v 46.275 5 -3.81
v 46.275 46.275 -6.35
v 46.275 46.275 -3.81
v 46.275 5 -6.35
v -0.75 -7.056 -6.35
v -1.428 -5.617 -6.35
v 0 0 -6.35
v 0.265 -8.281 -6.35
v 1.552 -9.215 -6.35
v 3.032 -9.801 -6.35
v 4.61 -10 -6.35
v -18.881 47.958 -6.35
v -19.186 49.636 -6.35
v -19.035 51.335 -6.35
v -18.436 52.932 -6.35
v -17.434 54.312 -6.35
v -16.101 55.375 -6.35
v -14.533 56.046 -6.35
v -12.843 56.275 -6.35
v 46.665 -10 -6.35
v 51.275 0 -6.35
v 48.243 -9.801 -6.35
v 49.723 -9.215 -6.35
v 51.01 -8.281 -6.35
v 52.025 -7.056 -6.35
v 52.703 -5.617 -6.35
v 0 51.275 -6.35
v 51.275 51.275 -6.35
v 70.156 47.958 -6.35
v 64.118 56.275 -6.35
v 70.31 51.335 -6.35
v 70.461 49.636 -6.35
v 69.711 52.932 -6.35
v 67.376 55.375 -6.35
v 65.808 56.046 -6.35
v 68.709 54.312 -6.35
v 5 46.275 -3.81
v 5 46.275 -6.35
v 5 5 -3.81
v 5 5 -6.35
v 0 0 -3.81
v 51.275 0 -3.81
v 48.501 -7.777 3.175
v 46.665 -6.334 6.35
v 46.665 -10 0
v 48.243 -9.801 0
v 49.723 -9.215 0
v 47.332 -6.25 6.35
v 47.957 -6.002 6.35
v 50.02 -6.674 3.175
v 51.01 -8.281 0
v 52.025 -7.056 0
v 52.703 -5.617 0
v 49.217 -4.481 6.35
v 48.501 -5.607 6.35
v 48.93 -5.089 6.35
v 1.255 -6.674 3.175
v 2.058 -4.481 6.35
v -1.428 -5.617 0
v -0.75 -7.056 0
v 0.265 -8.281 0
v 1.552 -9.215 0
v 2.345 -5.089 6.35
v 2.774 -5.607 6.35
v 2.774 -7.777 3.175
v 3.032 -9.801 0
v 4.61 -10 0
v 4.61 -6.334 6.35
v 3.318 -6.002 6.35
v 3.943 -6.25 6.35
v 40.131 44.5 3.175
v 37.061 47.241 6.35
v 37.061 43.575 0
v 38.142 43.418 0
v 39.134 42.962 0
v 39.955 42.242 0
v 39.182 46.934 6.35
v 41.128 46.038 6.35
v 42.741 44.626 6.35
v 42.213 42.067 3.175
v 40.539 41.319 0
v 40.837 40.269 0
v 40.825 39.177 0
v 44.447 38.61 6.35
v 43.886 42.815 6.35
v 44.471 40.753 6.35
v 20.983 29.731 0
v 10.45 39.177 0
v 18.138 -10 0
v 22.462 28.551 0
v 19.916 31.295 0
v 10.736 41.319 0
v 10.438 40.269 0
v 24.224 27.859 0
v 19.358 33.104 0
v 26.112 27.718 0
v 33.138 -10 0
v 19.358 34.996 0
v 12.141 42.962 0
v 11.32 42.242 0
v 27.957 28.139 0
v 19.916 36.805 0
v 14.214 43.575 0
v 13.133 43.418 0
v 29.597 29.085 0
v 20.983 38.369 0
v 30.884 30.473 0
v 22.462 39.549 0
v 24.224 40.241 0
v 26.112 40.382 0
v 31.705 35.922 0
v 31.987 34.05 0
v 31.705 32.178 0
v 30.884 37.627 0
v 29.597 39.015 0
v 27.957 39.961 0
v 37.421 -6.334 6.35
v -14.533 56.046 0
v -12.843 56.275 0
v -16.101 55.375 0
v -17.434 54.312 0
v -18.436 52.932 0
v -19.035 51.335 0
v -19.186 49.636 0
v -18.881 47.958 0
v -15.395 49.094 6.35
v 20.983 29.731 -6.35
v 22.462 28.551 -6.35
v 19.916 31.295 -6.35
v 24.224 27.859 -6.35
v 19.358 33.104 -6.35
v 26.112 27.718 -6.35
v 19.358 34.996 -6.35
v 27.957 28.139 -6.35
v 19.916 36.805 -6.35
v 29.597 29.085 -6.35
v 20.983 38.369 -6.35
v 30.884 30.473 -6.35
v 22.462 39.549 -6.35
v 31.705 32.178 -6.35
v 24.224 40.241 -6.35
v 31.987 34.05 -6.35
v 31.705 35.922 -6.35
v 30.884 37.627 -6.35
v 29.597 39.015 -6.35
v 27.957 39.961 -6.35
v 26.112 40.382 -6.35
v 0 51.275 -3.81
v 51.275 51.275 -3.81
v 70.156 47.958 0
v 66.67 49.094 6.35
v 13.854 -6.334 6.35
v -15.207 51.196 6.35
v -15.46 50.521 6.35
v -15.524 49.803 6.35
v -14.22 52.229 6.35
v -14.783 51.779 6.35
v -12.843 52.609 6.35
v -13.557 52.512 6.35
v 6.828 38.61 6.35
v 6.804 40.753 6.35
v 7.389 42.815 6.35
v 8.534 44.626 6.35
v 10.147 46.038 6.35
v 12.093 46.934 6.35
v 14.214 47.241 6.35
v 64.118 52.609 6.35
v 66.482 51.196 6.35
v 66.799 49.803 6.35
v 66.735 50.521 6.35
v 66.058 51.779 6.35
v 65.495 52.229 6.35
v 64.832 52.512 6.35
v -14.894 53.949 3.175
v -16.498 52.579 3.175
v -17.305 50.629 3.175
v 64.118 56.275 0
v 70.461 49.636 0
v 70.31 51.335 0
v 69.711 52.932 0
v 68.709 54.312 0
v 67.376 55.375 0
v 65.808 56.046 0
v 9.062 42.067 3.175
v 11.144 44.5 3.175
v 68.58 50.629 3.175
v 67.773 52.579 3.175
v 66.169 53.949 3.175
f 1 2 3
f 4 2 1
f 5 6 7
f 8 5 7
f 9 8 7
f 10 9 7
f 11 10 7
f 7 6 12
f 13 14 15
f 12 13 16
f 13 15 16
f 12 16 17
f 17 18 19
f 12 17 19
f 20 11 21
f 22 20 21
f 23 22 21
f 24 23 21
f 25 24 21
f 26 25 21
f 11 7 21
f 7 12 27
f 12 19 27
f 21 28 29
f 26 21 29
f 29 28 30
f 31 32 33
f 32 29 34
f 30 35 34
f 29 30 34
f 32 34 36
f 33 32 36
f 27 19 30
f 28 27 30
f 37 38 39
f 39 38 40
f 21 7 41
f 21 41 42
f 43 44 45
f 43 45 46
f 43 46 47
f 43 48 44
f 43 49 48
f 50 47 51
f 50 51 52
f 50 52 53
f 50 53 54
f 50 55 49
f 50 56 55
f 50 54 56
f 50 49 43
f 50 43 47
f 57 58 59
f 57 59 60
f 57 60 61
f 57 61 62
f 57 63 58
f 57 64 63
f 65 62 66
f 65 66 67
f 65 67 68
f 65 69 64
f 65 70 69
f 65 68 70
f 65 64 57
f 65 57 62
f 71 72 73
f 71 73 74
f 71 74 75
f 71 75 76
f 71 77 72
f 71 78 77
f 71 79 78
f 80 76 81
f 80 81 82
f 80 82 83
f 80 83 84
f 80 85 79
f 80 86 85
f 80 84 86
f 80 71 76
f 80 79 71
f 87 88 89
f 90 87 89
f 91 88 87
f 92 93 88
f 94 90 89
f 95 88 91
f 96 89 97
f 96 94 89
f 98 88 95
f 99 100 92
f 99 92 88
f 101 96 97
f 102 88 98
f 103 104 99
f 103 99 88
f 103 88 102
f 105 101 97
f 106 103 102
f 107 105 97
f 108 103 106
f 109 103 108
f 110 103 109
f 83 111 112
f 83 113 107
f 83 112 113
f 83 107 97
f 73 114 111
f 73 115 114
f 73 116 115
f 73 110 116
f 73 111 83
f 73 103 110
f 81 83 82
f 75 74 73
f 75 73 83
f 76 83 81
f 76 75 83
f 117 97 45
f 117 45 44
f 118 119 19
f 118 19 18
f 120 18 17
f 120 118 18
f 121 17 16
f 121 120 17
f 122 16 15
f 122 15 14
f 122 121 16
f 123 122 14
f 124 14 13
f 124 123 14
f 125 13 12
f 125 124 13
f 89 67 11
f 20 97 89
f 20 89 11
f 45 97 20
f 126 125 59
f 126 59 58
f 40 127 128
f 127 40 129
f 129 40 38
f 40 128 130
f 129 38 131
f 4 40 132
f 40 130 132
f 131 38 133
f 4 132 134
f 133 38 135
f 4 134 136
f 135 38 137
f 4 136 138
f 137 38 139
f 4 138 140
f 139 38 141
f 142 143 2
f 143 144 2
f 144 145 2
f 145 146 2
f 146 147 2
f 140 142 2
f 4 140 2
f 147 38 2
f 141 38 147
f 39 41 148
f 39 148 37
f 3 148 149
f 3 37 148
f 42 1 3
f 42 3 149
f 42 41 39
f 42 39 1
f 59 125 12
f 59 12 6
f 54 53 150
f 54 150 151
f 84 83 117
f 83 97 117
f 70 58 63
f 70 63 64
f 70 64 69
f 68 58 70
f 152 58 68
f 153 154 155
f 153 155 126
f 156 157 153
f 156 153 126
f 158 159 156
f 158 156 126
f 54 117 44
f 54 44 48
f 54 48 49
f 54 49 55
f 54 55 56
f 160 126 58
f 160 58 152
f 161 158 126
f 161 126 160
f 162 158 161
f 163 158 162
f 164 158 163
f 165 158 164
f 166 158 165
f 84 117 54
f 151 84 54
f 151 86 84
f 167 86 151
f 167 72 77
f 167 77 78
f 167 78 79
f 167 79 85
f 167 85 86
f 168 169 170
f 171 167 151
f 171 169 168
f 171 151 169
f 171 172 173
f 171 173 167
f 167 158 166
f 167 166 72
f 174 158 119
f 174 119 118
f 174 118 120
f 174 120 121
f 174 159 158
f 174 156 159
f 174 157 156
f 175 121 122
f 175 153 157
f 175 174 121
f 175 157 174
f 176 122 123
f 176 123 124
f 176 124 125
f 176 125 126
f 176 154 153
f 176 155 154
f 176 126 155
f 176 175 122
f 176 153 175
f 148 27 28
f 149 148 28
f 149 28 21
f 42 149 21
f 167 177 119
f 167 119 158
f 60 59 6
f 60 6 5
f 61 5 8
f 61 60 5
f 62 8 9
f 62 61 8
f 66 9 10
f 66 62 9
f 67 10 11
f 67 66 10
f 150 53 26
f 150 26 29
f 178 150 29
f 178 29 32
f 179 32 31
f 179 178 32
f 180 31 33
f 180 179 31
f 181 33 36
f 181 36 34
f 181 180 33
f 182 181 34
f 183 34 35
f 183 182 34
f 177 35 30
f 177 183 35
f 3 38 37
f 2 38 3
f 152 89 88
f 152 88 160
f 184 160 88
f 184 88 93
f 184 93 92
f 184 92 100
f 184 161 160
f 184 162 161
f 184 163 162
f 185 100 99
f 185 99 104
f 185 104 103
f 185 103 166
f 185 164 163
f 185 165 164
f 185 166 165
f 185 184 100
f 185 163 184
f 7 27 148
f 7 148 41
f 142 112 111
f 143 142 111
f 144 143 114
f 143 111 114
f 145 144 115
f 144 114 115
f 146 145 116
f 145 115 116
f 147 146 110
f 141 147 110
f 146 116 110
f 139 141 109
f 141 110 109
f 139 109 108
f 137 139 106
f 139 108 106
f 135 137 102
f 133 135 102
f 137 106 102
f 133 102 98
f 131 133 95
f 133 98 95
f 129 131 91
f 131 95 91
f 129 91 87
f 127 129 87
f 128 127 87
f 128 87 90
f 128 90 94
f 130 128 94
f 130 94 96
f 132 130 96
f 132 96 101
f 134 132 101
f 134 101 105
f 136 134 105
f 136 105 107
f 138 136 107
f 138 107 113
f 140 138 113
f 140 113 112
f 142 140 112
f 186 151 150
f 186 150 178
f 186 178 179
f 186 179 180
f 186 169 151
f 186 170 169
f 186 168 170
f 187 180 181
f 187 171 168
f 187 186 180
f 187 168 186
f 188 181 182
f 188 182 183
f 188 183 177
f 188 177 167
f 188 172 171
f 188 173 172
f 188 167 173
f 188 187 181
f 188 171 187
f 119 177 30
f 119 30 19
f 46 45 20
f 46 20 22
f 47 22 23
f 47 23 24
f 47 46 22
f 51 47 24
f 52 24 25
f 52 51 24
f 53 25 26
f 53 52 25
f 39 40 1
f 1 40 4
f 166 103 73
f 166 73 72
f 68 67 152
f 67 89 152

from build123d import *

# Parameters (mm, degrees)
F1_DEPTH = 6.35
F2_DEPTH = 6.35
F2_TAPER = 30
F3_R     = 6.35
F4_DEPTH = 25.4
F5_W     = 51.275
F5_H     = 51.275
F5_W_2   = 41.275
F5_H_2   = 41.275
F6_DEPTH = 2.54


with BuildPart() as f1:
    # F0 (on Top) → F1 (new body)
    with BuildSketch(Plane.XY):
        with BuildLine():
            Line((64.1179559298, 56.275), (25.6375, 56.275))
            Line((25.6375, 56.275), (-12.8429559298, 56.275))
            ThreePointArc((-12.8429559298, 56.275), (-17.9816380777, 53.6554752757), (-18.8806651275, 47.95813253))
            Line((-18.8806651275, 47.95813253), (-1.4278661837, -5.61686747))
            ThreePointArc((-1.4278661837, -5.61686747), (0.8793677383, -8.7886821479), (4.609843014, -10))
            Line((4.609843014, -10), (18.1375, -10))
            Line((18.1375, -10), (10.4500775472, 39.1765561679))
            ThreePointArc((10.4500775472, 39.1765561679), (11.3197051539, 42.2423099321), (14.2143615238, 43.575))
            Line((14.2143615238, 43.575), (37.0606384762, 43.575))
            ThreePointArc((37.0606384762, 43.575), (39.9552948461, 42.2423099321), (40.8249224528, 39.1765561679))
            Line((40.8249224528, 39.1765561679), (33.1375, -10))
            Line((33.1375, -10), (46.665156986, -10))
            ThreePointArc((46.665156986, -10), (50.3956322617, -8.7886821479), (52.7028661837, -5.61686747))
            Line((52.7028661837, -5.61686747), (70.1556651275, 47.95813253))
            ThreePointArc((70.1556651275, 47.95813253), (69.2566380777, 53.6554752757), (64.1179559298, 56.275))
        make_face()
        with BuildLine():
            Line((10.4500775472, 39.1765561679), (18.1375, -10))
            Line((18.1375, -10), (25.6375, -10))
            Line((25.6375, -10), (33.1375, -10))
            Line((33.1375, -10), (40.8249224528, 39.1765561679))
            ThreePointArc((40.8249224528, 39.1765561679), (39.9552948461, 42.2423099321), (37.0606384762, 43.575))
            Line((37.0606384762, 43.575), (14.2143615238, 43.575))
            ThreePointArc((14.2143615238, 43.575), (11.3197051539, 42.2423099321), (10.4500775472, 39.1765561679))
        make_face()
    extrude(amount=-F1_DEPTH)

    # F0 (on Top) → F2 (join)
    with BuildSketch(Plane.XY):
        with BuildLine():
            Line((64.1179559298, 56.275), (25.6375, 56.275))
            Line((25.6375, 56.275), (-12.8429559298, 56.275))
            ThreePointArc((-12.8429559298, 56.275), (-17.9816380777, 53.6554752757), (-18.8806651275, 47.95813253))
            Line((-18.8806651275, 47.95813253), (-1.4278661837, -5.61686747))
            ThreePointArc((-1.4278661837, -5.61686747), (0.8793677383, -8.7886821479), (4.609843014, -10))
            Line((4.609843014, -10), (18.1375, -10))
            Line((18.1375, -10), (10.4500775472, 39.1765561679))
            ThreePointArc((10.4500775472, 39.1765561679), (11.3197051539, 42.2423099321), (14.2143615238, 43.575))
            Line((14.2143615238, 43.575), (37.0606384762, 43.575))
            ThreePointArc((37.0606384762, 43.575), (39.9552948461, 42.2423099321), (40.8249224528, 39.1765561679))
            Line((40.8249224528, 39.1765561679), (33.1375, -10))
            Line((33.1375, -10), (46.665156986, -10))
            ThreePointArc((46.665156986, -10), (50.3956322617, -8.7886821479), (52.7028661837, -5.61686747))
            Line((52.7028661837, -5.61686747), (70.1556651275, 47.95813253))
            ThreePointArc((70.1556651275, 47.95813253), (69.2566380777, 53.6554752757), (64.1179559298, 56.275))
        make_face()
    extrude(amount=F2_DEPTH, taper=F2_TAPER)

    # F3 (on face) → F4 (cut)
    with BuildSketch(Plane.XY):
        with Locations((25.6375, 34.05)):
            Circle(F3_R)
    extrude(amount=-F4_DEPTH, mode=Mode.SUBTRACT)

    # F5 (on face) → F6 (cut)
    with BuildSketch(Plane(origin=(0, 0, -6.35), x_dir=(1, 0, 0), z_dir=(0, 0, -1))):
        with Locations((25.6375, -25.6375)):
            Rectangle(F5_W, F5_H)
        with Locations((25.6375, -25.6375)):
            Rectangle(F5_W_2, F5_H_2, mode=Mode.SUBTRACT)
    extrude(amount=-F6_DEPTH, mode=Mode.SUBTRACT)


solid = f1.part
